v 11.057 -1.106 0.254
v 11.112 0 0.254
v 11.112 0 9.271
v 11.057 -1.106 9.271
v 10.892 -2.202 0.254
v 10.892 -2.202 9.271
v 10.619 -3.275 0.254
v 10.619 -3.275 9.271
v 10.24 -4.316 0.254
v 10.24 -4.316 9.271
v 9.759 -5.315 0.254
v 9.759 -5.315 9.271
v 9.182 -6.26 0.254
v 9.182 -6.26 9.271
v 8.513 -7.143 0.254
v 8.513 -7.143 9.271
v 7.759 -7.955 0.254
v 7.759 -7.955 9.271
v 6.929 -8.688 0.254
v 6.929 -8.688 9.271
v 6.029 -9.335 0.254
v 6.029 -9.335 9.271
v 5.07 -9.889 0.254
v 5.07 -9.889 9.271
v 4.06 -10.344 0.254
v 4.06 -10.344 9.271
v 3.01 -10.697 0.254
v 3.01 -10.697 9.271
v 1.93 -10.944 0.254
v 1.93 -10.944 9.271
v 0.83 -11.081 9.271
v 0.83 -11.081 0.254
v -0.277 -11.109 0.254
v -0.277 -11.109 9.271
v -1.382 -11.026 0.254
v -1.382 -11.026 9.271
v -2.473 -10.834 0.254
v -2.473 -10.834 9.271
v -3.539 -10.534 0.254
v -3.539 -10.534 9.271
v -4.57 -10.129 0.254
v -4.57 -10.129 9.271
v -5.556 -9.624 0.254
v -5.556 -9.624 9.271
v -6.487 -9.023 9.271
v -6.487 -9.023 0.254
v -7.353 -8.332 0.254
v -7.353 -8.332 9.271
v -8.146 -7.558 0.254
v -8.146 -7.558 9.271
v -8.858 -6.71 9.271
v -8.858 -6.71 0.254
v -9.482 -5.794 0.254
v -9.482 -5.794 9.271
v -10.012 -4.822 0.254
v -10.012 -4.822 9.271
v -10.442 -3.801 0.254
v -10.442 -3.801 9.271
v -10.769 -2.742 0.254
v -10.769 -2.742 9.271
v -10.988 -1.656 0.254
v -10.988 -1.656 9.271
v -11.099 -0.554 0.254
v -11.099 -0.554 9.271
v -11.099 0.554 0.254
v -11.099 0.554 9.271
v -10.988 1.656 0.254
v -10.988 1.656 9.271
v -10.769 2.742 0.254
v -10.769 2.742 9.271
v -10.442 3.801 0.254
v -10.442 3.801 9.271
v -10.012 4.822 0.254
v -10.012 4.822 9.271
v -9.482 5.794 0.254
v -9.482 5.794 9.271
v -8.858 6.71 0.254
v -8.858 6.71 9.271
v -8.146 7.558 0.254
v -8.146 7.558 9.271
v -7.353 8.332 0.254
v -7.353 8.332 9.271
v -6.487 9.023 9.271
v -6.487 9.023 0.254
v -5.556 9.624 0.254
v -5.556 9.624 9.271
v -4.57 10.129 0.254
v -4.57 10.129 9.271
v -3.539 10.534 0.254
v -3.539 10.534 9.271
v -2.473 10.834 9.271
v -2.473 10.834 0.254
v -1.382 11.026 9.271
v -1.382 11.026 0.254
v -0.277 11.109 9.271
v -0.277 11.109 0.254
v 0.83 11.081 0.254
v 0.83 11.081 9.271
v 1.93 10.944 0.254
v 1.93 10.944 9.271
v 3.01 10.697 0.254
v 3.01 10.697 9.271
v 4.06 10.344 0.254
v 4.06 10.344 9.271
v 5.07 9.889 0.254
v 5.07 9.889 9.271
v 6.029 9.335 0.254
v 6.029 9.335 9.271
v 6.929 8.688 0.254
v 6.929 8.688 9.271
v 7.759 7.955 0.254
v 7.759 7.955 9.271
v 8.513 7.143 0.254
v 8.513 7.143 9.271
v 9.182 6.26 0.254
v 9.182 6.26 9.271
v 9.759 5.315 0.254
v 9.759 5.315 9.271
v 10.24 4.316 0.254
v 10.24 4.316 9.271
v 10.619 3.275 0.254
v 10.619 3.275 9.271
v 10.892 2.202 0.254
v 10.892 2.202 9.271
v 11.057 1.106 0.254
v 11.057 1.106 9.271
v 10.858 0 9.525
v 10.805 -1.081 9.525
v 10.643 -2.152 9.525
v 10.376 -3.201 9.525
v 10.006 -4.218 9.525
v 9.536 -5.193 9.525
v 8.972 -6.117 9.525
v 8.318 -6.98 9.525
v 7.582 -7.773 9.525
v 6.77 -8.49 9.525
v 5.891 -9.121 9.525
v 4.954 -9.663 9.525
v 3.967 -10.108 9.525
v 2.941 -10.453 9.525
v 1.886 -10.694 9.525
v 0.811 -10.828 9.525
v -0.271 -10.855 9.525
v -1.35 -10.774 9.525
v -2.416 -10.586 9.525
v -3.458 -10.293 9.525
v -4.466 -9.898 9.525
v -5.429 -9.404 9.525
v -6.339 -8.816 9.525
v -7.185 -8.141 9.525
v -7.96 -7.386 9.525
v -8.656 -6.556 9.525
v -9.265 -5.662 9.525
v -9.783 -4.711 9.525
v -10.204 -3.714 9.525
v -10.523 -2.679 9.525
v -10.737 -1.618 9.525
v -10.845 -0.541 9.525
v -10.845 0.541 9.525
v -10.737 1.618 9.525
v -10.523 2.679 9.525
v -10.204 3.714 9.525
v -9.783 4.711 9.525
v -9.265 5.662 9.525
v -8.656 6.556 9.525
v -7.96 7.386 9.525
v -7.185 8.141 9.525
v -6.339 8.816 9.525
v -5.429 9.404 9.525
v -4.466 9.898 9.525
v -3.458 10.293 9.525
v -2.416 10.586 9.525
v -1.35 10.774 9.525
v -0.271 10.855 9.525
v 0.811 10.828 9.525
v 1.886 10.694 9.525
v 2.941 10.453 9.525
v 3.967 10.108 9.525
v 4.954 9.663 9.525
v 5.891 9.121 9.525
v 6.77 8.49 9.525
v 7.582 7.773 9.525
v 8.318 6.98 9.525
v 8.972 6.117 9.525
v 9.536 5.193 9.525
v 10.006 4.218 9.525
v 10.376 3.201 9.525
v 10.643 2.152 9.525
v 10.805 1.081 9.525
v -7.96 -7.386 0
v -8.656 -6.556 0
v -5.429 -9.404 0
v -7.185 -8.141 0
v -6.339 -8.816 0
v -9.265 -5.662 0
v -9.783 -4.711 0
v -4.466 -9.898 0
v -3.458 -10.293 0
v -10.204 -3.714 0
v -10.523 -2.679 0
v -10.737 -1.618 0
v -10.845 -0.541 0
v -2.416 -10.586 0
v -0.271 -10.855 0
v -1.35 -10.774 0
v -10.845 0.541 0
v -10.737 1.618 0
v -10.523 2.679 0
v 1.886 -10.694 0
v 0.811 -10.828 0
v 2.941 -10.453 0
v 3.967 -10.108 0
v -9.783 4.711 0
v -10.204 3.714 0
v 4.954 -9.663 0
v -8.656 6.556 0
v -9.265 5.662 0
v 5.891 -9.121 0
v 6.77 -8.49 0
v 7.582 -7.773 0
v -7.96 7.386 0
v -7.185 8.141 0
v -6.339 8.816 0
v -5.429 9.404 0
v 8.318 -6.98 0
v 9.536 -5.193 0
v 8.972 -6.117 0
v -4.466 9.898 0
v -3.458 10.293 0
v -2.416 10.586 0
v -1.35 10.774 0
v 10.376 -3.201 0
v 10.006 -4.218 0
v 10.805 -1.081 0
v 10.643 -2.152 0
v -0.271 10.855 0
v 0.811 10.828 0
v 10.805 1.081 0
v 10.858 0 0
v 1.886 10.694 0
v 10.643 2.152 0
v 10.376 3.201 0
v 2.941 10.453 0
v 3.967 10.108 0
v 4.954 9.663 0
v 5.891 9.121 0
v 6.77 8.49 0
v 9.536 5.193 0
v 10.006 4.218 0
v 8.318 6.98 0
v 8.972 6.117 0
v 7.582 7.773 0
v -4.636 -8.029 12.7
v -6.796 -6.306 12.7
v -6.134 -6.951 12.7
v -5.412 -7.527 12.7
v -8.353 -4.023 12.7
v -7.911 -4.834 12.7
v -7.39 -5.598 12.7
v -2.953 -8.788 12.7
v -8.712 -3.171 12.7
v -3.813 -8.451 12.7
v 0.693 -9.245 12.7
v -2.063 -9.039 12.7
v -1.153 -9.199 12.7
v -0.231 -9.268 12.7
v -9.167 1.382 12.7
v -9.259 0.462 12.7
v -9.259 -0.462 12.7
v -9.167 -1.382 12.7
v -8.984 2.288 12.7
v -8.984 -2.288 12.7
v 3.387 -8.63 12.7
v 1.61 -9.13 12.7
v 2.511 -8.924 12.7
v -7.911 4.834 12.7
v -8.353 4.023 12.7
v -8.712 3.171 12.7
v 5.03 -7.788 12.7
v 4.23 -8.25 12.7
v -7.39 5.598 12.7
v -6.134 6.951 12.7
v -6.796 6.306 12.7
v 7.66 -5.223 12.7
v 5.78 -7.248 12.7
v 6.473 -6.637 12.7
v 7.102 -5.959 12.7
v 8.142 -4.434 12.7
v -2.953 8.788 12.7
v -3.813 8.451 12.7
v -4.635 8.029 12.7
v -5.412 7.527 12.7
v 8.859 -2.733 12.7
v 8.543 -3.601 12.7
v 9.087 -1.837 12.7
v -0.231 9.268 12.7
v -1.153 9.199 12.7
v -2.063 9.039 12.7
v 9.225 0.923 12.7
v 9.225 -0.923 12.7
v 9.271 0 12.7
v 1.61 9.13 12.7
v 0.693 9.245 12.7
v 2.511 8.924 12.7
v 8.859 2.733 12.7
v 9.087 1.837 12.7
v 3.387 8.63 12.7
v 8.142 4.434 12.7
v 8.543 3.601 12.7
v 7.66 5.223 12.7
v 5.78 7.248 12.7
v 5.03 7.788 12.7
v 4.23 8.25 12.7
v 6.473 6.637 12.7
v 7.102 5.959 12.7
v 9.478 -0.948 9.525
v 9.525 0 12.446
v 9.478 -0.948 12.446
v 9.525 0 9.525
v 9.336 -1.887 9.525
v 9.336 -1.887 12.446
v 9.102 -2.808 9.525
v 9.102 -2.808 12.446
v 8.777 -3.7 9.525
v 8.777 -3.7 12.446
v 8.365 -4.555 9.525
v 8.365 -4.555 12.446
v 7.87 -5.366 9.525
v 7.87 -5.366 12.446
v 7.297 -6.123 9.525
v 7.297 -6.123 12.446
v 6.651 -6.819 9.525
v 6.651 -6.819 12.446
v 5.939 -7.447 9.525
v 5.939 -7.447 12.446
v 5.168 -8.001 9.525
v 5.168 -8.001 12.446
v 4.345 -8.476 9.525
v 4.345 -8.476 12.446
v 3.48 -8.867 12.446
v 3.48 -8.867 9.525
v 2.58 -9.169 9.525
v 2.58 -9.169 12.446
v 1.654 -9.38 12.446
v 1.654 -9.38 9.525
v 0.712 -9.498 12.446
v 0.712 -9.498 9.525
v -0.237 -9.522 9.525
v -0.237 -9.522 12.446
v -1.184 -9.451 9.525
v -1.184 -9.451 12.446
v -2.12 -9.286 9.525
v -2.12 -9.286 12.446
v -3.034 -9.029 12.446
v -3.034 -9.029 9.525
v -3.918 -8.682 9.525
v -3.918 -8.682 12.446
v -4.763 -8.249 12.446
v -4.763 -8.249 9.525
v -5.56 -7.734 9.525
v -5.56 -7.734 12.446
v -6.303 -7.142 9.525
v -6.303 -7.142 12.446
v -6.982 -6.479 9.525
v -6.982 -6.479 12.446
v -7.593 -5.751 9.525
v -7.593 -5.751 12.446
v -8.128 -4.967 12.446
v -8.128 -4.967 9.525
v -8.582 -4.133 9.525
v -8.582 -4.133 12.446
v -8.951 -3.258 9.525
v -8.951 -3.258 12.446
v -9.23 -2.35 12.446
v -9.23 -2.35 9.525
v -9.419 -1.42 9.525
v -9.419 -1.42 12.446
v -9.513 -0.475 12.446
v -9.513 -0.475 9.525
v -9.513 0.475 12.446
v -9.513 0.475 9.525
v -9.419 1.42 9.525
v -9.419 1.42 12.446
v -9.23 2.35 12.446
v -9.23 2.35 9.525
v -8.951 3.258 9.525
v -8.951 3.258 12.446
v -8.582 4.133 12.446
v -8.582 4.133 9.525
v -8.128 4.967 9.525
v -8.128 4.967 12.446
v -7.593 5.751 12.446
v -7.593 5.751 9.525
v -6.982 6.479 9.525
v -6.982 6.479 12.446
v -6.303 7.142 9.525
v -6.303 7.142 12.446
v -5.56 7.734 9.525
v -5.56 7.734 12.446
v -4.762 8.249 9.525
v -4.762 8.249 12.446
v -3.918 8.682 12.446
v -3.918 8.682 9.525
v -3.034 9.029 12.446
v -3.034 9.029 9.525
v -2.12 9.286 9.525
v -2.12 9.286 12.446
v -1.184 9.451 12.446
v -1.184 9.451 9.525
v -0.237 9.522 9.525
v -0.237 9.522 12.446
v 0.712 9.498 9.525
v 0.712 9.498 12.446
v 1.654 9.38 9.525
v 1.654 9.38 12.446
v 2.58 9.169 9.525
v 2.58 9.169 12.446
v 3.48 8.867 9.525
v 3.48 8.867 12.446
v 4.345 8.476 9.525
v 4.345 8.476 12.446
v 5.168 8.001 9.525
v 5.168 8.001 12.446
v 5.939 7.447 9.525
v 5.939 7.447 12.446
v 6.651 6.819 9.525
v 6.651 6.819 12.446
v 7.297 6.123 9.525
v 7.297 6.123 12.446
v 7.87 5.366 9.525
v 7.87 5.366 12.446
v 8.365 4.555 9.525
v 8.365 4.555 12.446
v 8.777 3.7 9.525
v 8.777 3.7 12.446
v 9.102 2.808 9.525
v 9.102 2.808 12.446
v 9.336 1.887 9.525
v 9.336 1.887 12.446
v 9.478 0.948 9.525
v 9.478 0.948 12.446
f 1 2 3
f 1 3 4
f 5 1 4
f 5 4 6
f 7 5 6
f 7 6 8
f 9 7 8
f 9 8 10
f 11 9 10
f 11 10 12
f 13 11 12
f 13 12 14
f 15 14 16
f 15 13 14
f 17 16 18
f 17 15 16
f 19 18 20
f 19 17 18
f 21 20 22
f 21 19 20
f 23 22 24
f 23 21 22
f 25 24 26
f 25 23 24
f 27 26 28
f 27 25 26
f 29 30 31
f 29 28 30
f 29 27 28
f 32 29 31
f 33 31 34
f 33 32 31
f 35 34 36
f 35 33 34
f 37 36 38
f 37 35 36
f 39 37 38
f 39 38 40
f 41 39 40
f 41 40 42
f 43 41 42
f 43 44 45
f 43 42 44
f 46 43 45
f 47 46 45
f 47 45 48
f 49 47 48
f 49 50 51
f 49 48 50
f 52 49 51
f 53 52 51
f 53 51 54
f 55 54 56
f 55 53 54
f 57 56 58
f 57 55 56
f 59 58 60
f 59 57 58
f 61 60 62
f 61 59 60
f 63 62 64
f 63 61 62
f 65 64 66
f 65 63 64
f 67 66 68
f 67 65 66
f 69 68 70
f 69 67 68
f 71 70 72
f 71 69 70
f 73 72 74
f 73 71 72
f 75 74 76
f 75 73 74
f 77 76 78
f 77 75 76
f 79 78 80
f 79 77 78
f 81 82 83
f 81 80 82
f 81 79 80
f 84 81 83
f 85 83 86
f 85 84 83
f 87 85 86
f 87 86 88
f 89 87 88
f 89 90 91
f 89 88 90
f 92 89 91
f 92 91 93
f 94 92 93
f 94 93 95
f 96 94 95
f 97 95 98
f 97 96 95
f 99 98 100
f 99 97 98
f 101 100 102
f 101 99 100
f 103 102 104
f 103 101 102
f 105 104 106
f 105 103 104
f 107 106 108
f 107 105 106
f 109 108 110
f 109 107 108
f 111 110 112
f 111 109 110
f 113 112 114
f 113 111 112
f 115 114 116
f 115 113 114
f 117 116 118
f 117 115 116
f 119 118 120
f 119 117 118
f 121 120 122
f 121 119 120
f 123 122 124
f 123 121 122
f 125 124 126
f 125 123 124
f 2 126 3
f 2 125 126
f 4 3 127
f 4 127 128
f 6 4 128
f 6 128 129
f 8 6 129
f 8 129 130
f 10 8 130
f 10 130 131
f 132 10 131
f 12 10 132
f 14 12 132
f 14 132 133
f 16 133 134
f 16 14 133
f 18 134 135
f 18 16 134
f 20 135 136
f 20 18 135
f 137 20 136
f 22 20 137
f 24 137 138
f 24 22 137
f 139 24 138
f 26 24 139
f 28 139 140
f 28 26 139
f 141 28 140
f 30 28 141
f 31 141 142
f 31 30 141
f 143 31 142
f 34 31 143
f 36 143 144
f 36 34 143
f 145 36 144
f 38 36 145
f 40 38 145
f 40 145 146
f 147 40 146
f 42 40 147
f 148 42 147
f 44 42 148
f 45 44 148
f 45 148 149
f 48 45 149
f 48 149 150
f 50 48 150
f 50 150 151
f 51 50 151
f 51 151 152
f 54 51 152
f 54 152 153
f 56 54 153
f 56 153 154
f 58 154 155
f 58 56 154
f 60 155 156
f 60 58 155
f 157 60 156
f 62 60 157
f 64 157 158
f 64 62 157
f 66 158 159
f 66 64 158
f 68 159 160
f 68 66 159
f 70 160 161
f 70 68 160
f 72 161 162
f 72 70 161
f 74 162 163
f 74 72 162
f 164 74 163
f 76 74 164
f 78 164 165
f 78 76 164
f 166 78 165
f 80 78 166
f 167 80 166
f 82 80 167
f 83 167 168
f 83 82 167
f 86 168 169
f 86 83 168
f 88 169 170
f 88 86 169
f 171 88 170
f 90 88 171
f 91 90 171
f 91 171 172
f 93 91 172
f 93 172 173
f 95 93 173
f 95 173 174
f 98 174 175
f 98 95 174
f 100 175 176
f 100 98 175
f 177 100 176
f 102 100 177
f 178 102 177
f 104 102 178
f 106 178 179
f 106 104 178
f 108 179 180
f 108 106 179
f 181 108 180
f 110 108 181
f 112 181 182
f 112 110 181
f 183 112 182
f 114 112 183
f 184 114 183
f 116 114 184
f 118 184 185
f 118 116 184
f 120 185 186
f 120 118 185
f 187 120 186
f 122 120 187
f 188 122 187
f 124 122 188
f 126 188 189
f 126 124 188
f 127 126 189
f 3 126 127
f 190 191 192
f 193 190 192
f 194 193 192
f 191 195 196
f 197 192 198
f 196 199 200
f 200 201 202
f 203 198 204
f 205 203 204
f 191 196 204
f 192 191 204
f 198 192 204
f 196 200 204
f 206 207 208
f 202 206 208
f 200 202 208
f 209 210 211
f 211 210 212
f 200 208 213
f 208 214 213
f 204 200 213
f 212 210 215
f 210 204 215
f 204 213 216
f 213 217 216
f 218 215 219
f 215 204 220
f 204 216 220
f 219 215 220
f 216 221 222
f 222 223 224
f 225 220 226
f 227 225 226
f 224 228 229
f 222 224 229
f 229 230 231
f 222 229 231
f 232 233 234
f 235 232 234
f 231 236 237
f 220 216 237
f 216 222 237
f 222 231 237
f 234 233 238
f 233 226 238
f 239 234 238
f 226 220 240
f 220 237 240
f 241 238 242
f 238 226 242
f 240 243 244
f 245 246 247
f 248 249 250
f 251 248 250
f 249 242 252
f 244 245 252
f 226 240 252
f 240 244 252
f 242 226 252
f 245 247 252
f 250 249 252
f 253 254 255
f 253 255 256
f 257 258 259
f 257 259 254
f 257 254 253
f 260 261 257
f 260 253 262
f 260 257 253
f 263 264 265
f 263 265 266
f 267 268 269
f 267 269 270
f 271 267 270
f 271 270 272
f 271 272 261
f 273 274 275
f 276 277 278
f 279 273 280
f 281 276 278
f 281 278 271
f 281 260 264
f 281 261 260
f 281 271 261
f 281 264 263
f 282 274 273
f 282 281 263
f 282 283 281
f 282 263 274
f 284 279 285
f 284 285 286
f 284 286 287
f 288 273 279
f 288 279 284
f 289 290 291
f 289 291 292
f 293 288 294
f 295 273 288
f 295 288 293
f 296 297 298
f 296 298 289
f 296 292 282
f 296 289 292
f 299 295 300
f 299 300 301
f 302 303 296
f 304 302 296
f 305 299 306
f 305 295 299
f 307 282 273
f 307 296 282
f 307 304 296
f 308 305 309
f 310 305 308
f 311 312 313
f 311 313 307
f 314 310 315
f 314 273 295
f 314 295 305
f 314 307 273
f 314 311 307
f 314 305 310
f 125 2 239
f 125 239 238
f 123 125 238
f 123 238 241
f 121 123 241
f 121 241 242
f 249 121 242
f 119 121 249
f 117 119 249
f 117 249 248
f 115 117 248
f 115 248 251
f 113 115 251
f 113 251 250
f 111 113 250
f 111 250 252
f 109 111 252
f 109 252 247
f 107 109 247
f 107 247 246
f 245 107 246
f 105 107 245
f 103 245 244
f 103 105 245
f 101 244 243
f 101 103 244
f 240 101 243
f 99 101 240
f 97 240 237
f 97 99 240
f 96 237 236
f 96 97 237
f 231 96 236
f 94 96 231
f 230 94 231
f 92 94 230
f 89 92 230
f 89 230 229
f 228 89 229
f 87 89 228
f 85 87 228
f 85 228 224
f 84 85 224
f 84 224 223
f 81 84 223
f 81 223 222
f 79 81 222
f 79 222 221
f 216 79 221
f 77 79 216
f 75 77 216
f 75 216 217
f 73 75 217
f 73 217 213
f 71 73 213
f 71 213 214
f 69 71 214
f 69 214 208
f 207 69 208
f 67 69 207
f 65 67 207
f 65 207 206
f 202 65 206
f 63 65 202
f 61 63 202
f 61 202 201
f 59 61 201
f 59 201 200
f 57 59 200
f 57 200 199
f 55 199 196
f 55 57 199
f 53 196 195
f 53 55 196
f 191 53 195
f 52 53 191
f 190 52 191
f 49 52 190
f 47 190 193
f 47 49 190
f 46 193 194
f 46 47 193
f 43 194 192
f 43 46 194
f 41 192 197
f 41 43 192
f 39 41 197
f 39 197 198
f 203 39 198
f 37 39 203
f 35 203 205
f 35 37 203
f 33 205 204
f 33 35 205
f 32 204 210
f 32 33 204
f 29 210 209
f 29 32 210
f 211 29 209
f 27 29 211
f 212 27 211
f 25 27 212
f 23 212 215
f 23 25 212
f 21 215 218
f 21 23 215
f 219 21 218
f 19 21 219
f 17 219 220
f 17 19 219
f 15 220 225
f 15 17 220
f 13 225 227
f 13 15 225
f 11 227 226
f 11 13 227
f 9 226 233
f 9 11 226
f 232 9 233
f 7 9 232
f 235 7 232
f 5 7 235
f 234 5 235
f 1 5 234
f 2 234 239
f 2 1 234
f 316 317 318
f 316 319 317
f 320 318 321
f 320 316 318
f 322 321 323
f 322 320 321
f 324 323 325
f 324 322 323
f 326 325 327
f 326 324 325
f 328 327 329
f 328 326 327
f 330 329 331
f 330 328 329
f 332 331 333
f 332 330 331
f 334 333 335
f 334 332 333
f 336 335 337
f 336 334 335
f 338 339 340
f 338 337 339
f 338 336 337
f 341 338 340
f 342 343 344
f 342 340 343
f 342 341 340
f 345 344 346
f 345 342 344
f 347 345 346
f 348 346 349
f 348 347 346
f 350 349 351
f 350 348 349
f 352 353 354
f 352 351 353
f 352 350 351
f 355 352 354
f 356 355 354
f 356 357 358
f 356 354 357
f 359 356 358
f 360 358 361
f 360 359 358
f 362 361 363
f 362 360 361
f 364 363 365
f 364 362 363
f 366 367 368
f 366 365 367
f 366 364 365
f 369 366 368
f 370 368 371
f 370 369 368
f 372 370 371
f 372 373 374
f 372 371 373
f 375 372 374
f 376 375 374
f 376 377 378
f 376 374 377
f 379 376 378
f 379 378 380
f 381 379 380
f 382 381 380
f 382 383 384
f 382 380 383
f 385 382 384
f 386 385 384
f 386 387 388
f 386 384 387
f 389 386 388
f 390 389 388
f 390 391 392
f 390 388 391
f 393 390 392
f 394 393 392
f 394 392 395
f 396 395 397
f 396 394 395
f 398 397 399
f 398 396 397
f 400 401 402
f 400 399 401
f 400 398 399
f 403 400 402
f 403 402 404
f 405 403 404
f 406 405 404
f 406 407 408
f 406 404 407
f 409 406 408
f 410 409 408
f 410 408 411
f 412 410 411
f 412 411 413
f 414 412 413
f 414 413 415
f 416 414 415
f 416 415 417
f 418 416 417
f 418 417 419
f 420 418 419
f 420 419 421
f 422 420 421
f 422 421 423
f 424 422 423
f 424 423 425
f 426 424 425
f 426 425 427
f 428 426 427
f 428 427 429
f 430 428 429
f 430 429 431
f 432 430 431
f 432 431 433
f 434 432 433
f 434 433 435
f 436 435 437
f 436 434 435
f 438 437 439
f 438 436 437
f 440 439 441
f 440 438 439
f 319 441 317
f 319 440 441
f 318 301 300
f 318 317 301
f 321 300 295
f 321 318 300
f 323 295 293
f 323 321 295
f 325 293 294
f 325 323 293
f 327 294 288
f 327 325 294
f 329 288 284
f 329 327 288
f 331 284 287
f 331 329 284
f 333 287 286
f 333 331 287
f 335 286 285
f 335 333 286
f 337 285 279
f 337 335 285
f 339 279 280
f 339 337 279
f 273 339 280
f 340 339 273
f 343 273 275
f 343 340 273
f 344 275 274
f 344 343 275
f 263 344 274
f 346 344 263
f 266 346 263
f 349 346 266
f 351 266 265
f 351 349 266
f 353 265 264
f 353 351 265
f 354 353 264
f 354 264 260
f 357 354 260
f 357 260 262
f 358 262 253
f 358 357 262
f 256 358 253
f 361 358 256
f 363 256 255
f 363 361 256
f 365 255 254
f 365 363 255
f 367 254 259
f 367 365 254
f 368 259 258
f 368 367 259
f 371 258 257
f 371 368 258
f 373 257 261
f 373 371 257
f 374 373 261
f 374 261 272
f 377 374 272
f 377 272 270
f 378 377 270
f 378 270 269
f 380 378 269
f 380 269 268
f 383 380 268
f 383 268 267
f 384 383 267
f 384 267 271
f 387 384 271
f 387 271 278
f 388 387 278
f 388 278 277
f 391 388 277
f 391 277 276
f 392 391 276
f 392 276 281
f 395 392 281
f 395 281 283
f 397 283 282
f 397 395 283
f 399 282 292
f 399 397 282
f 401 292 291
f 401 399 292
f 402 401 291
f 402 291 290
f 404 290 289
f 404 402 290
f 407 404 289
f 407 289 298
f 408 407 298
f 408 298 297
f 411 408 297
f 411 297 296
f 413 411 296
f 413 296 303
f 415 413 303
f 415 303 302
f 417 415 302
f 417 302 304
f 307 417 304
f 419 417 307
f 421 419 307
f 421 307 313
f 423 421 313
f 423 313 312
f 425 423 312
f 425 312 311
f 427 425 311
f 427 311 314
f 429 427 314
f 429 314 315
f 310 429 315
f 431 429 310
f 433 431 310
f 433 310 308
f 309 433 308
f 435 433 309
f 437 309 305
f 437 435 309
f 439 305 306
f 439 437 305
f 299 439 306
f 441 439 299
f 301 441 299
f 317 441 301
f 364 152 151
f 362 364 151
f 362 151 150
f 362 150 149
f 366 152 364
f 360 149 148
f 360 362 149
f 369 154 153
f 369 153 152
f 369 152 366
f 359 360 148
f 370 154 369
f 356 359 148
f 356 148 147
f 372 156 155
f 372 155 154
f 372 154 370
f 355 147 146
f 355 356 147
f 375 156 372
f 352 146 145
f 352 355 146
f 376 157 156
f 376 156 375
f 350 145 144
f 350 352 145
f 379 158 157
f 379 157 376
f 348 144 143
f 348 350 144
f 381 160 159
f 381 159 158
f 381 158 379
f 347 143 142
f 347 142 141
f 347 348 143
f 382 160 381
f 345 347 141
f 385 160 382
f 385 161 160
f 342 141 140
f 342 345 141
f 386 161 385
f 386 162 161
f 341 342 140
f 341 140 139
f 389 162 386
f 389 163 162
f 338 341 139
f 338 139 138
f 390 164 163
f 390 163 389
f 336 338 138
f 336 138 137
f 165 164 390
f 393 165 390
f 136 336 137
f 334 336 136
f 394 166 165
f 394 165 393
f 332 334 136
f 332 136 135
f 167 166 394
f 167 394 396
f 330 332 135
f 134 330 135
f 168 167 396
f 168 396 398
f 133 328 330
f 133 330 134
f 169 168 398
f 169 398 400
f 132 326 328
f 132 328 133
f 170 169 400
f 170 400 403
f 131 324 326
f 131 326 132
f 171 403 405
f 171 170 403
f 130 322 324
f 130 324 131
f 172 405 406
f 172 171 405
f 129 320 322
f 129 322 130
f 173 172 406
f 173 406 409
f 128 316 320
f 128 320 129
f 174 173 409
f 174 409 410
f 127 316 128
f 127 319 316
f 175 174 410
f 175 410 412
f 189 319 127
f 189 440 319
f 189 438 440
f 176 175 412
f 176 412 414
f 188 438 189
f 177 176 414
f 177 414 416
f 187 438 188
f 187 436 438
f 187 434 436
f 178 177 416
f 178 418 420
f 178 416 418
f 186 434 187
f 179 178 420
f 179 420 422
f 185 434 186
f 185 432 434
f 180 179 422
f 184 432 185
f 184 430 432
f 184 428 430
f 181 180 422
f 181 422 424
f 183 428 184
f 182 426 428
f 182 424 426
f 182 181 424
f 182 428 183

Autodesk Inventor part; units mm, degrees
ref_plane "YZ Plane" through (0, 0, 0) normal (1, 0, 0) x (0, 1, 0)
ref_plane "XZ Plane" through (0, 0, 0) normal (0, 1, 0) x (-1, 0, 0)
ref_plane "XY Plane" through (0, 0, 0) normal (0, 0, 1) x (1, 0, 0)
sketch "Sketch1" plane through (0, 0, 0) normal (0, 0, 1) x (1, 0, 0)
  circle A0 centre (0, 0) radius 11.1125
  dimension "d5" = 22.225
extrude "Extrusion1" add sketch "Sketch1" along normal blind 9.525
sketch "Sketch2" plane through (0, 0, 9.525) normal (0, 0, 1) x (1, 0, 0)
  circle A0 centre (0, 0) radius 11.1125 projected
  circle A1 centre (0, 0) radius 9.525
  dimension "d4" = 19.05
extrude "Extrusion2" add sketch "Sketch2" along normal blind 3.175 contours A1
chamfer "Chamfer1" distance 0.254 angle 45 3 edges at (-9.525, 0, 12.7) (-11.1125, 0, 9.525) (-11.1125, 0, 0)
properties part number "rear cyl head"
